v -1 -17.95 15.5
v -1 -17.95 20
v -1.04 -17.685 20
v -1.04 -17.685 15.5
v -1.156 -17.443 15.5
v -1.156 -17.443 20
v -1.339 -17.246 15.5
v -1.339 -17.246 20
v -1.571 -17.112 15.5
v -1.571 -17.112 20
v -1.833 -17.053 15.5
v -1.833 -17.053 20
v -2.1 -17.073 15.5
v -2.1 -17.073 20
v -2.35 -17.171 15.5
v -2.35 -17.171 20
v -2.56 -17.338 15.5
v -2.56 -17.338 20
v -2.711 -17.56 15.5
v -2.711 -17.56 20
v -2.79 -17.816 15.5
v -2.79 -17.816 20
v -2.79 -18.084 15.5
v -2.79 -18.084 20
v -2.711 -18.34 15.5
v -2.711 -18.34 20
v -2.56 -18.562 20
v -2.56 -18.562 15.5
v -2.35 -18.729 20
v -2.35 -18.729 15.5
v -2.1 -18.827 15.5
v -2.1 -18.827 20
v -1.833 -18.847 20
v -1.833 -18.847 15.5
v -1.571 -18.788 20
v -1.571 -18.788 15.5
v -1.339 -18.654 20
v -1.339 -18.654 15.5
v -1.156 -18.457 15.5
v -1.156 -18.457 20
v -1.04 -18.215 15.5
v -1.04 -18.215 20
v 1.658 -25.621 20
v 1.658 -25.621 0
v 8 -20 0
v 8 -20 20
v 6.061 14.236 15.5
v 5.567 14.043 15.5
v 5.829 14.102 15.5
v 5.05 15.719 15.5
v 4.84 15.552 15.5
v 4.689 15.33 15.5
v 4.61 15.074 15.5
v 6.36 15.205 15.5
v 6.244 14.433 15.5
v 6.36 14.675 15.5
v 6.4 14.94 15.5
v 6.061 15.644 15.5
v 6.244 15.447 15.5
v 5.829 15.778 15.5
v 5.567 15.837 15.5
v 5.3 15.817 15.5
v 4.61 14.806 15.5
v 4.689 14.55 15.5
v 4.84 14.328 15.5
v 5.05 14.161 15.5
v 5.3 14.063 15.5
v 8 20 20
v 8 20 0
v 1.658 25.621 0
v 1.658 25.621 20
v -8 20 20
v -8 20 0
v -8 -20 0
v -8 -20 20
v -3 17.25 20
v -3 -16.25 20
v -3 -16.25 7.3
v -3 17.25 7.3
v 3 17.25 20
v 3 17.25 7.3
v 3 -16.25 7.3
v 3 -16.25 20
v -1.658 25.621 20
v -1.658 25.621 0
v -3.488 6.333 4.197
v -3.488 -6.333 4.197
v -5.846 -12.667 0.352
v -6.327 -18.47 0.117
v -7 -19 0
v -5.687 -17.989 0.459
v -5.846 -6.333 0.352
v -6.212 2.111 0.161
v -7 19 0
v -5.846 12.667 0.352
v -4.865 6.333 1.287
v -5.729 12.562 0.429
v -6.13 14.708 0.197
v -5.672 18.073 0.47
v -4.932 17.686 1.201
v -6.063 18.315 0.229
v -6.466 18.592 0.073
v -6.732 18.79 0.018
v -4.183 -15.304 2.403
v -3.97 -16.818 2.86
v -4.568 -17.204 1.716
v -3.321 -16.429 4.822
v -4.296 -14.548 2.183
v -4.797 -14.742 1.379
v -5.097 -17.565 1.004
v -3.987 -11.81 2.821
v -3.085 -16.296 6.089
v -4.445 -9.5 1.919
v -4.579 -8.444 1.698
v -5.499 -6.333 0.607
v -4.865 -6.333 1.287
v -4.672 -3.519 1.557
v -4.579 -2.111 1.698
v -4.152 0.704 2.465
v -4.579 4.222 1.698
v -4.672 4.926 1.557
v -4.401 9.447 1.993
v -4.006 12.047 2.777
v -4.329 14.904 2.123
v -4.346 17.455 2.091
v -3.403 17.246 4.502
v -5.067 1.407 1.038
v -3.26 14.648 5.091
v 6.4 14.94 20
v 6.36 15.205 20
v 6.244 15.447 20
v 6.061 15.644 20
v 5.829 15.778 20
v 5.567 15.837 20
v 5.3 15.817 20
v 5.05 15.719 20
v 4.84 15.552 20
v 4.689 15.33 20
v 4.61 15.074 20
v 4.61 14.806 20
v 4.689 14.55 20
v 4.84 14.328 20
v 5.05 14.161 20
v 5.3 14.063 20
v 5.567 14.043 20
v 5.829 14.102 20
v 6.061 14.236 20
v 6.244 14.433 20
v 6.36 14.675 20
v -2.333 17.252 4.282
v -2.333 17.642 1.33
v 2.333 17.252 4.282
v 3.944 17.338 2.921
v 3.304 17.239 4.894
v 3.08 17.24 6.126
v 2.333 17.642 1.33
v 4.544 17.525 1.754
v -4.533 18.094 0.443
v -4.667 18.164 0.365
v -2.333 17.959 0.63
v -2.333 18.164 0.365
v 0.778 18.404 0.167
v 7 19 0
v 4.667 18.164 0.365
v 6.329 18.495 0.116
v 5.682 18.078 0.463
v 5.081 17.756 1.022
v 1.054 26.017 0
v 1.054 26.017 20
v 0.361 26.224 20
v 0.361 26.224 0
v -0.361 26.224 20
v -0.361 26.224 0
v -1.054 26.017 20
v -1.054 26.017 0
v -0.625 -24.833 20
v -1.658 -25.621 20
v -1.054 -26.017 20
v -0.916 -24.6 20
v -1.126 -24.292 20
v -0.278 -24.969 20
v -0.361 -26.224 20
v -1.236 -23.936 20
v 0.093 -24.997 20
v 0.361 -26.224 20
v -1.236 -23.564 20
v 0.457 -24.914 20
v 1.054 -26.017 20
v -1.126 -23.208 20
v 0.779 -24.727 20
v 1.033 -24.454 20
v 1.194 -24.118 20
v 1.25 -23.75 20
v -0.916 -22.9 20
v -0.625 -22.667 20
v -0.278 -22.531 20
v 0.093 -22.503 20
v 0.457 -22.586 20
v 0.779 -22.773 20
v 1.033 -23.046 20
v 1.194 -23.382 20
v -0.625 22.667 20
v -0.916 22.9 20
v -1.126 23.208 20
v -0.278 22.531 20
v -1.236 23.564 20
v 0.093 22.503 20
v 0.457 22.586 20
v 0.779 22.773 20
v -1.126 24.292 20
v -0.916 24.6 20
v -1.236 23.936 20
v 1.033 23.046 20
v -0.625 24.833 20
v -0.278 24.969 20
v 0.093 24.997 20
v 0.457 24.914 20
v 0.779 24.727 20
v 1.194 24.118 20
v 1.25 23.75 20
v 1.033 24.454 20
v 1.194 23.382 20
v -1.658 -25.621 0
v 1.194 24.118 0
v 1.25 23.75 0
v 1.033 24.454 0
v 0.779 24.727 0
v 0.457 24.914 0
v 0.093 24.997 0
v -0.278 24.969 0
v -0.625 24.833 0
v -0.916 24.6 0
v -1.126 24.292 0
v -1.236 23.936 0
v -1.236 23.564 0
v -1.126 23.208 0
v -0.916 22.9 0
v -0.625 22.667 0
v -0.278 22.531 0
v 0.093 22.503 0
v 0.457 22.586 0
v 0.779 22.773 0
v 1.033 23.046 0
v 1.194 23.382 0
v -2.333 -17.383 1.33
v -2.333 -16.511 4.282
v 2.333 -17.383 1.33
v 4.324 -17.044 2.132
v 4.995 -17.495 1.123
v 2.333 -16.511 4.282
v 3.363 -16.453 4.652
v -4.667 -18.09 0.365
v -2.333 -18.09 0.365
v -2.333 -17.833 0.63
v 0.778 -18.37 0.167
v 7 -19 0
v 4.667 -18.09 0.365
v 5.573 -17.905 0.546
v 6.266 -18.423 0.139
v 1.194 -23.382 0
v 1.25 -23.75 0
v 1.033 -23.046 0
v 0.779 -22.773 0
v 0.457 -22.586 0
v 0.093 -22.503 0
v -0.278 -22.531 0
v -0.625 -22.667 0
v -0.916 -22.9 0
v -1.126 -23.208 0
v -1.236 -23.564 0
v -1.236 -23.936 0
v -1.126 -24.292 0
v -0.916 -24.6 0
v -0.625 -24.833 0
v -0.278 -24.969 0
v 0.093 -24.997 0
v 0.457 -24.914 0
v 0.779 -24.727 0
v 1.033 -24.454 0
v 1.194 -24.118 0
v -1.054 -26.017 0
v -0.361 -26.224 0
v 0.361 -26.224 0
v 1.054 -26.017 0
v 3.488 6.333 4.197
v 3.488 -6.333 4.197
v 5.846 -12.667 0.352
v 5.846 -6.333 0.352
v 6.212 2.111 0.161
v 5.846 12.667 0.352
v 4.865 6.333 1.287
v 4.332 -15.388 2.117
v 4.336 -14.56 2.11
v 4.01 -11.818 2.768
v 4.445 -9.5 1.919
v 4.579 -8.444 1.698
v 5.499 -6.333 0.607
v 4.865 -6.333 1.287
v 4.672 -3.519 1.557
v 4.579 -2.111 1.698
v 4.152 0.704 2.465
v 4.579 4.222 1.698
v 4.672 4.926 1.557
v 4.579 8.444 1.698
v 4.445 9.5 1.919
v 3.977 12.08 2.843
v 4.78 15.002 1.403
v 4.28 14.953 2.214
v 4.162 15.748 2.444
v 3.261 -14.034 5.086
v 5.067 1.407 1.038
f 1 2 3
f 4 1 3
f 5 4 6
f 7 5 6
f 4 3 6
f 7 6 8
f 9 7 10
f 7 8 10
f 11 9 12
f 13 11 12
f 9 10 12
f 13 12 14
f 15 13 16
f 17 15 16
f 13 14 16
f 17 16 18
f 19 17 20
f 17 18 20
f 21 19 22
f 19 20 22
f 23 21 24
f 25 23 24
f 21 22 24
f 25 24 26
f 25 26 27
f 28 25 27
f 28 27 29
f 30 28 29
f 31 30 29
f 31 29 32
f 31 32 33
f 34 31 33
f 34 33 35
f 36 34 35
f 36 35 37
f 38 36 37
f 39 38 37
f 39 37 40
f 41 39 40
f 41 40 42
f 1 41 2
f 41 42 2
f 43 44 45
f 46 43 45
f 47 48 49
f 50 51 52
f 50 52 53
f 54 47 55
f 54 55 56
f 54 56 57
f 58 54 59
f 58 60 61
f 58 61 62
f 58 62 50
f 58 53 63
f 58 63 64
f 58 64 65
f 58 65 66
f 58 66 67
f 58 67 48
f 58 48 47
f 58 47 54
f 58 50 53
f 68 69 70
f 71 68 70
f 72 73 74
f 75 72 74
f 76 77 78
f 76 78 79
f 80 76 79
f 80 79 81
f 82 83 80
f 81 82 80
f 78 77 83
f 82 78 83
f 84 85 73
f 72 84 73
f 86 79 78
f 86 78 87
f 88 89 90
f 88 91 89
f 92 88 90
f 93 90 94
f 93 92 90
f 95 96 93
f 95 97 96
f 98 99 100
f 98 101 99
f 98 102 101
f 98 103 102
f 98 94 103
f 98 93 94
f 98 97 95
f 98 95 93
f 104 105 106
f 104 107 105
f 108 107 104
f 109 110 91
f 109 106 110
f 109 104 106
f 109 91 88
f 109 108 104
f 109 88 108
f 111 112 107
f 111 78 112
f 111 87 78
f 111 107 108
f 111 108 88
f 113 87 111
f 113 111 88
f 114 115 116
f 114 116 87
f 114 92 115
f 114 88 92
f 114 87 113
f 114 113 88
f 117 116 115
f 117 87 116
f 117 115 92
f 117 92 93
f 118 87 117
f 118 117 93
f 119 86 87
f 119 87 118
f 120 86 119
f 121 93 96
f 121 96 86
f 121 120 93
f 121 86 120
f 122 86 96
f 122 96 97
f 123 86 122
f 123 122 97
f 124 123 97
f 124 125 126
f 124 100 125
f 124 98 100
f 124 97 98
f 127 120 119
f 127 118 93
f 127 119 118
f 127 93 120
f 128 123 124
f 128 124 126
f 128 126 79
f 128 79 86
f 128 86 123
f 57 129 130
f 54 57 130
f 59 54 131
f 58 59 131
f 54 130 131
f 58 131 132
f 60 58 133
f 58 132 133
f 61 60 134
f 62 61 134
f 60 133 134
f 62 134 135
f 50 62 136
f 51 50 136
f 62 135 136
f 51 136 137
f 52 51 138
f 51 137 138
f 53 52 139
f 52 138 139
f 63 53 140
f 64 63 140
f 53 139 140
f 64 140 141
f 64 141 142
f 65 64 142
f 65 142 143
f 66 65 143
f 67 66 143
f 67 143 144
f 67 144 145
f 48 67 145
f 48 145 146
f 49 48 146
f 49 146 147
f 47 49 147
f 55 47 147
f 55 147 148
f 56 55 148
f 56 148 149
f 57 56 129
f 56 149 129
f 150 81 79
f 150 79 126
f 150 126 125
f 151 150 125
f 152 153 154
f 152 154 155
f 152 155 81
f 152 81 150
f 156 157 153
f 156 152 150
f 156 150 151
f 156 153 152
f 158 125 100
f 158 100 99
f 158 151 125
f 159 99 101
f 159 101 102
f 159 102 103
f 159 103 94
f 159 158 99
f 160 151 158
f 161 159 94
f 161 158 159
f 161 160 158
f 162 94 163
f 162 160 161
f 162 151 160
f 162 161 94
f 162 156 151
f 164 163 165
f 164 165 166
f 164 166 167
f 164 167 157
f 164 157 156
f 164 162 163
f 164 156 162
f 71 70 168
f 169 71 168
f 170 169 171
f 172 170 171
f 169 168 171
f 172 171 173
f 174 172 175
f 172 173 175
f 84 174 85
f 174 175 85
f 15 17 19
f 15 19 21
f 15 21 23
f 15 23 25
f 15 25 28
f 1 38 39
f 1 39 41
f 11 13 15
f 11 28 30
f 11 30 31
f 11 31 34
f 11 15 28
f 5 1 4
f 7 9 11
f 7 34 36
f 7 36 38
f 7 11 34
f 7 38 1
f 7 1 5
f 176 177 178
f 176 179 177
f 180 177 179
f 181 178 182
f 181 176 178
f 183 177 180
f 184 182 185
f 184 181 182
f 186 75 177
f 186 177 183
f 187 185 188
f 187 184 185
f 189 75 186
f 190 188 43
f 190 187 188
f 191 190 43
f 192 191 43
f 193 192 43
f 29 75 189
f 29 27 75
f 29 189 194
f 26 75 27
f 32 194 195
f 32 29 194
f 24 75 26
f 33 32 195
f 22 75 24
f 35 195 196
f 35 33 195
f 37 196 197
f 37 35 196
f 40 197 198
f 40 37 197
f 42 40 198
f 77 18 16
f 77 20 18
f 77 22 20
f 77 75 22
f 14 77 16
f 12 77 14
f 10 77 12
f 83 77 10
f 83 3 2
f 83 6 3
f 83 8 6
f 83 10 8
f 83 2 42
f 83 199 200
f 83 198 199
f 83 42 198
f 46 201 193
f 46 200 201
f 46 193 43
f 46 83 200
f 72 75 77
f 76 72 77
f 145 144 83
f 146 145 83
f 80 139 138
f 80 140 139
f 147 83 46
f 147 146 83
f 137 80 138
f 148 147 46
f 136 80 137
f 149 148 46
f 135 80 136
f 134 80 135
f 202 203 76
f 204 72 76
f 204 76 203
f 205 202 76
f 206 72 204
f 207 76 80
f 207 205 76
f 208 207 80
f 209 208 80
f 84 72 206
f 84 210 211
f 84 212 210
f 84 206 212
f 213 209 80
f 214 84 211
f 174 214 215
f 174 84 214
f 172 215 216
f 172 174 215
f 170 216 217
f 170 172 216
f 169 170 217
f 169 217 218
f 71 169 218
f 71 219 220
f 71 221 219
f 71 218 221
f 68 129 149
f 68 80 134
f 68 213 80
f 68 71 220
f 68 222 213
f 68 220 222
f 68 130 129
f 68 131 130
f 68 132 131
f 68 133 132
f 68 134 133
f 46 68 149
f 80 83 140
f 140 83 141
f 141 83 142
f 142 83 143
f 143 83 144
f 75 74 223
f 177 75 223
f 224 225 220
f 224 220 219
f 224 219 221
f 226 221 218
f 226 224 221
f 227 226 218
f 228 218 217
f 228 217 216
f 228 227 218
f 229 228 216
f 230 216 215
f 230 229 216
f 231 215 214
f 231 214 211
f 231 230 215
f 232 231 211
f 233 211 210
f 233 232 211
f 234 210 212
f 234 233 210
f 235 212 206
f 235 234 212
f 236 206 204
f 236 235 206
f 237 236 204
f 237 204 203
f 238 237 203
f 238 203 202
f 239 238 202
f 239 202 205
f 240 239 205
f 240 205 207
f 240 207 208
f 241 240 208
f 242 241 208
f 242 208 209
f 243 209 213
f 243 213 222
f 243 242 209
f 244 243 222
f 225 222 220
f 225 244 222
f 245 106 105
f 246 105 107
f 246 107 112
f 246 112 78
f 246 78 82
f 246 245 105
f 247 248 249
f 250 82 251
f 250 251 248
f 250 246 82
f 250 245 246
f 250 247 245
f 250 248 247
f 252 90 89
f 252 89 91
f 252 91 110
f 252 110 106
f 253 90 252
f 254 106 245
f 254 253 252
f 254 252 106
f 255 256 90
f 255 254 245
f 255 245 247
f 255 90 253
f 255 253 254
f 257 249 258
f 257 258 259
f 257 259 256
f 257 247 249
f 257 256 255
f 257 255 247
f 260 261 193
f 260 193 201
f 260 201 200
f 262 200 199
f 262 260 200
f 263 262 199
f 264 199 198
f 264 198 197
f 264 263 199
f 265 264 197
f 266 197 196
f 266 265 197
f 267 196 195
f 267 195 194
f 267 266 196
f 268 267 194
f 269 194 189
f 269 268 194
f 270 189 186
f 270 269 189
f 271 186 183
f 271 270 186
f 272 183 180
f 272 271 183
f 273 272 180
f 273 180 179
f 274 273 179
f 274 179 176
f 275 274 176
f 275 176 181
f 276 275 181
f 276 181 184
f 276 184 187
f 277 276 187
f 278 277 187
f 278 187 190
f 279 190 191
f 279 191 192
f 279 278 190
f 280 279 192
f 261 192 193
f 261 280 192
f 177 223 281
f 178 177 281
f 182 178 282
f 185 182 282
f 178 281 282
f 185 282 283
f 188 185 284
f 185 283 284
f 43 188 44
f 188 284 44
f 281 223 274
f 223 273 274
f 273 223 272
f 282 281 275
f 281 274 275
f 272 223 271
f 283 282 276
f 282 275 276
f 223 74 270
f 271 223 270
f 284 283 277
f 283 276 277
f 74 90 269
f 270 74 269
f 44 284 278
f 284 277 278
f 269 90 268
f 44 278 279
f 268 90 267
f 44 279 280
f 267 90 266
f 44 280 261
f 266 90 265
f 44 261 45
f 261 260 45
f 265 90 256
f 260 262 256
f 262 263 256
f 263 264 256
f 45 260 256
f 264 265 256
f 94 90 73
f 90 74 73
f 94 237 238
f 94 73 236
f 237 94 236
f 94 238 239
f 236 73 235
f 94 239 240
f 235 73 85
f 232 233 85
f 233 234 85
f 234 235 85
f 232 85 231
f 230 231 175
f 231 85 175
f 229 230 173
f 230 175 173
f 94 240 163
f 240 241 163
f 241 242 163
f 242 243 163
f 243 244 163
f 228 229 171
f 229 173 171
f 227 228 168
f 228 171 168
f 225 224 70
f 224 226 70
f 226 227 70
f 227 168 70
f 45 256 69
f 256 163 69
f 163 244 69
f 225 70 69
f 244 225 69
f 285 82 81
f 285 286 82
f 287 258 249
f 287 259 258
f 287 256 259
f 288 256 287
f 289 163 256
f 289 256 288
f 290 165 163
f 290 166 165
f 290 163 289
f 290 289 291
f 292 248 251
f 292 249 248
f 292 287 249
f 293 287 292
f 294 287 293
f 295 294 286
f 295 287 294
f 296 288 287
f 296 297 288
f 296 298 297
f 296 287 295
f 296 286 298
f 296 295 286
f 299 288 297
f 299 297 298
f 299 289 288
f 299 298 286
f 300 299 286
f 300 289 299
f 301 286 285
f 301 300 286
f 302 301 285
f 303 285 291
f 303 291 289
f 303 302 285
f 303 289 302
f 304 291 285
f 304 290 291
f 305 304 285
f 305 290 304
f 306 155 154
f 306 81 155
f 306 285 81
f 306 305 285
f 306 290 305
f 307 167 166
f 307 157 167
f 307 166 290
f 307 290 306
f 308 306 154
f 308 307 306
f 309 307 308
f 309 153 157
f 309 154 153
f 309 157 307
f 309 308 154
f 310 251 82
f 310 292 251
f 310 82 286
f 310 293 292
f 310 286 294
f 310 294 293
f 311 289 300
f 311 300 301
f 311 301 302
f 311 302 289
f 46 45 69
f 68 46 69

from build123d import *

# Parameters (mm, degrees)
F0_R     = 1.25
F1_DEPTH = 20
F2_W     = 14
F2_H     = 38
F2_W_2   = 6
F2_H_2   = 33.5
F3_DEPTH = 12.7
F8_R     = 0.9
F9_DEPTH = 4.5


with BuildPart() as f1:
    # F0 (on Top) → F1 (new body)
    with BuildSketch(Plane.XY):
        Polygon((8, 20), (-8, 20), (-8, 0), (-8, -20), (8, -20), (8, 0), align=None)
        Polygon((-7, 0), (-7, 19), (7, 19), (7, 0), (7, -19), (-7, -19), align=None, mode=Mode.SUBTRACT)
        with BuildLine():
            Line((-1.6582336623, 25.6208984796), (-8, 20))
            Line((-8, 20), (8, 20))
            Line((8, 20), (1.6582336623, 25.6208984796))
            ThreePointArc((1.6582336623, 25.6208984796), (2.2798666799, 24.7757718665), (2.5, 23.75))
            ThreePointArc((2.5, 23.75), (-1.0257718665, 21.4701333201), (-1.6582336623, 25.6208984796))
        make_face()
        with BuildLine():
            ThreePointArc((1.6582336623, 25.6208984796), (0, 26.25), (-1.6582336623, 25.6208984796))
            ThreePointArc((-1.6582336623, 25.6208984796), (-1.0257718665, 21.4701333201), (2.5, 23.75))
            ThreePointArc((2.5, 23.75), (2.2798666799, 24.7757718665), (1.6582336623, 25.6208984796))
        make_face()
        with Locations((0, 23.75)):
            Circle(F0_R, mode=Mode.SUBTRACT)
        with BuildLine():
            Line((8, -20), (-8, -20))
            Line((-8, -20), (-1.6582336623, -25.6208984796))
            ThreePointArc((-1.6582336623, -25.6208984796), (-1.0257718665, -21.4701333201), (2.5, -23.75))
            ThreePointArc((2.5, -23.75), (2.2798666799, -24.7757718665), (1.6582336623, -25.6208984796))
            Line((1.6582336623, -25.6208984796), (8, -20))
        make_face()
        with BuildLine():
            ThreePointArc((2.5, -23.75), (-1.0257718665, -21.4701333201), (-1.6582336623, -25.6208984796))
            ThreePointArc((-1.6582336623, -25.6208984796), (0, -26.25), (1.6582336623, -25.6208984796))
            ThreePointArc((1.6582336623, -25.6208984796), (2.2798666799, -24.7757718665), (2.5, -23.75))
        make_face()
        with Locations((0, -23.75)):
            Circle(F0_R, mode=Mode.SUBTRACT)
    extrude(amount=F1_DEPTH)

    # F2 (on face) → F3 (join)
    with BuildSketch(Plane.XY.offset(20)):
        Rectangle(F2_W, F2_H)
        with Locations((0, 0.5)):
            Rectangle(F2_W_2, F2_H_2, mode=Mode.SUBTRACT)
    extrude(amount=-F3_DEPTH)

    # F6: sweep along a path in F6_path
    with BuildLine(Plane(origin=(-7, 19, 0), x_dir=(0, 1, 0), z_dir=(0, 0, 1))) as f6_path:
        Line((0, 0), (0, -14))
    # F4 (on face) → F6 (sweep)
    with BuildSketch(Plane.YZ.offset(-7)):
        with BuildLine():
            Line((-19, 7.3), (-19, 0))
            add(Edge.make_bspline(
                [(-19, 0), (-16.966280043, 0), (-16.25, 4.7682679952), (-16.25, 7.3)],
                knots=[0, 0, 0, 0, 7.8008012409, 7.8008012409, 7.8008012409, 7.8008012409], degree=3))
            Line((-16.25, 7.3), (-19, 7.3))
        make_face()
        with BuildLine():
            Line((19, 7.3), (17.25, 7.3))
            add(Edge.make_bspline(
                [(19, 0), (16.966280043, 0), (17.25, 4.7682679952), (17.25, 7.3)],
                knots=[0, 0, 0, 0, 7.5068302232, 7.5068302232, 7.5068302232, 7.5068302232], degree=3))
            Line((19, 0), (19, 7.3))
        make_face()
    sweep(path=f6_path.line)

    # F7: sweep along a path in F7_path
    with BuildLine(Plane(origin=(-7, -19, 0), x_dir=(0, -1, 0), z_dir=(0, 0, -1))) as f7_path:
        Line((0, 0), (-38, 0))
    # F5 (on face) → F7 (sweep)
    with BuildSketch(Plane(origin=(0, -19, 0), x_dir=(-1, 0, 0), z_dir=(0, 1, 0))):
        with BuildLine():
            add(Edge.make_bspline(
                [(7, 0), (4.5295656249, 0), (3, 4.5769013319), (3, 7.3)],
                knots=[0, 0, 0, 0, 8.3240615087, 8.3240615087, 8.3240615087, 8.3240615087], degree=3))
            Line((7, 0), (7, 7.3))
            Line((7, 7.3), (3, 7.3))
        make_face()
        with BuildLine():
            Line((-7, 7.3), (-7, 0))
            add(Edge.make_bspline(
                [(-7, 0), (-4.5295656249, 0), (-3, 4.5769013319), (-3, 7.3)],
                knots=[0, 0, 0, 0, 8.3240615087, 8.3240615087, 8.3240615087, 8.3240615087], degree=3))
            Line((-3, 7.3), (-7, 7.3))
        make_face()
    sweep(path=f7_path.line)

    # F8 (on face) → F9 (cut)
    with BuildSketch(Plane.XY.offset(20)):
        with Locations((5.5, 14.94)):
            Circle(F8_R)
        with Locations((-1.9, -17.95)):
            Circle(F8_R)
    extrude(amount=-F9_DEPTH, mode=Mode.SUBTRACT)


solid = f1.part
